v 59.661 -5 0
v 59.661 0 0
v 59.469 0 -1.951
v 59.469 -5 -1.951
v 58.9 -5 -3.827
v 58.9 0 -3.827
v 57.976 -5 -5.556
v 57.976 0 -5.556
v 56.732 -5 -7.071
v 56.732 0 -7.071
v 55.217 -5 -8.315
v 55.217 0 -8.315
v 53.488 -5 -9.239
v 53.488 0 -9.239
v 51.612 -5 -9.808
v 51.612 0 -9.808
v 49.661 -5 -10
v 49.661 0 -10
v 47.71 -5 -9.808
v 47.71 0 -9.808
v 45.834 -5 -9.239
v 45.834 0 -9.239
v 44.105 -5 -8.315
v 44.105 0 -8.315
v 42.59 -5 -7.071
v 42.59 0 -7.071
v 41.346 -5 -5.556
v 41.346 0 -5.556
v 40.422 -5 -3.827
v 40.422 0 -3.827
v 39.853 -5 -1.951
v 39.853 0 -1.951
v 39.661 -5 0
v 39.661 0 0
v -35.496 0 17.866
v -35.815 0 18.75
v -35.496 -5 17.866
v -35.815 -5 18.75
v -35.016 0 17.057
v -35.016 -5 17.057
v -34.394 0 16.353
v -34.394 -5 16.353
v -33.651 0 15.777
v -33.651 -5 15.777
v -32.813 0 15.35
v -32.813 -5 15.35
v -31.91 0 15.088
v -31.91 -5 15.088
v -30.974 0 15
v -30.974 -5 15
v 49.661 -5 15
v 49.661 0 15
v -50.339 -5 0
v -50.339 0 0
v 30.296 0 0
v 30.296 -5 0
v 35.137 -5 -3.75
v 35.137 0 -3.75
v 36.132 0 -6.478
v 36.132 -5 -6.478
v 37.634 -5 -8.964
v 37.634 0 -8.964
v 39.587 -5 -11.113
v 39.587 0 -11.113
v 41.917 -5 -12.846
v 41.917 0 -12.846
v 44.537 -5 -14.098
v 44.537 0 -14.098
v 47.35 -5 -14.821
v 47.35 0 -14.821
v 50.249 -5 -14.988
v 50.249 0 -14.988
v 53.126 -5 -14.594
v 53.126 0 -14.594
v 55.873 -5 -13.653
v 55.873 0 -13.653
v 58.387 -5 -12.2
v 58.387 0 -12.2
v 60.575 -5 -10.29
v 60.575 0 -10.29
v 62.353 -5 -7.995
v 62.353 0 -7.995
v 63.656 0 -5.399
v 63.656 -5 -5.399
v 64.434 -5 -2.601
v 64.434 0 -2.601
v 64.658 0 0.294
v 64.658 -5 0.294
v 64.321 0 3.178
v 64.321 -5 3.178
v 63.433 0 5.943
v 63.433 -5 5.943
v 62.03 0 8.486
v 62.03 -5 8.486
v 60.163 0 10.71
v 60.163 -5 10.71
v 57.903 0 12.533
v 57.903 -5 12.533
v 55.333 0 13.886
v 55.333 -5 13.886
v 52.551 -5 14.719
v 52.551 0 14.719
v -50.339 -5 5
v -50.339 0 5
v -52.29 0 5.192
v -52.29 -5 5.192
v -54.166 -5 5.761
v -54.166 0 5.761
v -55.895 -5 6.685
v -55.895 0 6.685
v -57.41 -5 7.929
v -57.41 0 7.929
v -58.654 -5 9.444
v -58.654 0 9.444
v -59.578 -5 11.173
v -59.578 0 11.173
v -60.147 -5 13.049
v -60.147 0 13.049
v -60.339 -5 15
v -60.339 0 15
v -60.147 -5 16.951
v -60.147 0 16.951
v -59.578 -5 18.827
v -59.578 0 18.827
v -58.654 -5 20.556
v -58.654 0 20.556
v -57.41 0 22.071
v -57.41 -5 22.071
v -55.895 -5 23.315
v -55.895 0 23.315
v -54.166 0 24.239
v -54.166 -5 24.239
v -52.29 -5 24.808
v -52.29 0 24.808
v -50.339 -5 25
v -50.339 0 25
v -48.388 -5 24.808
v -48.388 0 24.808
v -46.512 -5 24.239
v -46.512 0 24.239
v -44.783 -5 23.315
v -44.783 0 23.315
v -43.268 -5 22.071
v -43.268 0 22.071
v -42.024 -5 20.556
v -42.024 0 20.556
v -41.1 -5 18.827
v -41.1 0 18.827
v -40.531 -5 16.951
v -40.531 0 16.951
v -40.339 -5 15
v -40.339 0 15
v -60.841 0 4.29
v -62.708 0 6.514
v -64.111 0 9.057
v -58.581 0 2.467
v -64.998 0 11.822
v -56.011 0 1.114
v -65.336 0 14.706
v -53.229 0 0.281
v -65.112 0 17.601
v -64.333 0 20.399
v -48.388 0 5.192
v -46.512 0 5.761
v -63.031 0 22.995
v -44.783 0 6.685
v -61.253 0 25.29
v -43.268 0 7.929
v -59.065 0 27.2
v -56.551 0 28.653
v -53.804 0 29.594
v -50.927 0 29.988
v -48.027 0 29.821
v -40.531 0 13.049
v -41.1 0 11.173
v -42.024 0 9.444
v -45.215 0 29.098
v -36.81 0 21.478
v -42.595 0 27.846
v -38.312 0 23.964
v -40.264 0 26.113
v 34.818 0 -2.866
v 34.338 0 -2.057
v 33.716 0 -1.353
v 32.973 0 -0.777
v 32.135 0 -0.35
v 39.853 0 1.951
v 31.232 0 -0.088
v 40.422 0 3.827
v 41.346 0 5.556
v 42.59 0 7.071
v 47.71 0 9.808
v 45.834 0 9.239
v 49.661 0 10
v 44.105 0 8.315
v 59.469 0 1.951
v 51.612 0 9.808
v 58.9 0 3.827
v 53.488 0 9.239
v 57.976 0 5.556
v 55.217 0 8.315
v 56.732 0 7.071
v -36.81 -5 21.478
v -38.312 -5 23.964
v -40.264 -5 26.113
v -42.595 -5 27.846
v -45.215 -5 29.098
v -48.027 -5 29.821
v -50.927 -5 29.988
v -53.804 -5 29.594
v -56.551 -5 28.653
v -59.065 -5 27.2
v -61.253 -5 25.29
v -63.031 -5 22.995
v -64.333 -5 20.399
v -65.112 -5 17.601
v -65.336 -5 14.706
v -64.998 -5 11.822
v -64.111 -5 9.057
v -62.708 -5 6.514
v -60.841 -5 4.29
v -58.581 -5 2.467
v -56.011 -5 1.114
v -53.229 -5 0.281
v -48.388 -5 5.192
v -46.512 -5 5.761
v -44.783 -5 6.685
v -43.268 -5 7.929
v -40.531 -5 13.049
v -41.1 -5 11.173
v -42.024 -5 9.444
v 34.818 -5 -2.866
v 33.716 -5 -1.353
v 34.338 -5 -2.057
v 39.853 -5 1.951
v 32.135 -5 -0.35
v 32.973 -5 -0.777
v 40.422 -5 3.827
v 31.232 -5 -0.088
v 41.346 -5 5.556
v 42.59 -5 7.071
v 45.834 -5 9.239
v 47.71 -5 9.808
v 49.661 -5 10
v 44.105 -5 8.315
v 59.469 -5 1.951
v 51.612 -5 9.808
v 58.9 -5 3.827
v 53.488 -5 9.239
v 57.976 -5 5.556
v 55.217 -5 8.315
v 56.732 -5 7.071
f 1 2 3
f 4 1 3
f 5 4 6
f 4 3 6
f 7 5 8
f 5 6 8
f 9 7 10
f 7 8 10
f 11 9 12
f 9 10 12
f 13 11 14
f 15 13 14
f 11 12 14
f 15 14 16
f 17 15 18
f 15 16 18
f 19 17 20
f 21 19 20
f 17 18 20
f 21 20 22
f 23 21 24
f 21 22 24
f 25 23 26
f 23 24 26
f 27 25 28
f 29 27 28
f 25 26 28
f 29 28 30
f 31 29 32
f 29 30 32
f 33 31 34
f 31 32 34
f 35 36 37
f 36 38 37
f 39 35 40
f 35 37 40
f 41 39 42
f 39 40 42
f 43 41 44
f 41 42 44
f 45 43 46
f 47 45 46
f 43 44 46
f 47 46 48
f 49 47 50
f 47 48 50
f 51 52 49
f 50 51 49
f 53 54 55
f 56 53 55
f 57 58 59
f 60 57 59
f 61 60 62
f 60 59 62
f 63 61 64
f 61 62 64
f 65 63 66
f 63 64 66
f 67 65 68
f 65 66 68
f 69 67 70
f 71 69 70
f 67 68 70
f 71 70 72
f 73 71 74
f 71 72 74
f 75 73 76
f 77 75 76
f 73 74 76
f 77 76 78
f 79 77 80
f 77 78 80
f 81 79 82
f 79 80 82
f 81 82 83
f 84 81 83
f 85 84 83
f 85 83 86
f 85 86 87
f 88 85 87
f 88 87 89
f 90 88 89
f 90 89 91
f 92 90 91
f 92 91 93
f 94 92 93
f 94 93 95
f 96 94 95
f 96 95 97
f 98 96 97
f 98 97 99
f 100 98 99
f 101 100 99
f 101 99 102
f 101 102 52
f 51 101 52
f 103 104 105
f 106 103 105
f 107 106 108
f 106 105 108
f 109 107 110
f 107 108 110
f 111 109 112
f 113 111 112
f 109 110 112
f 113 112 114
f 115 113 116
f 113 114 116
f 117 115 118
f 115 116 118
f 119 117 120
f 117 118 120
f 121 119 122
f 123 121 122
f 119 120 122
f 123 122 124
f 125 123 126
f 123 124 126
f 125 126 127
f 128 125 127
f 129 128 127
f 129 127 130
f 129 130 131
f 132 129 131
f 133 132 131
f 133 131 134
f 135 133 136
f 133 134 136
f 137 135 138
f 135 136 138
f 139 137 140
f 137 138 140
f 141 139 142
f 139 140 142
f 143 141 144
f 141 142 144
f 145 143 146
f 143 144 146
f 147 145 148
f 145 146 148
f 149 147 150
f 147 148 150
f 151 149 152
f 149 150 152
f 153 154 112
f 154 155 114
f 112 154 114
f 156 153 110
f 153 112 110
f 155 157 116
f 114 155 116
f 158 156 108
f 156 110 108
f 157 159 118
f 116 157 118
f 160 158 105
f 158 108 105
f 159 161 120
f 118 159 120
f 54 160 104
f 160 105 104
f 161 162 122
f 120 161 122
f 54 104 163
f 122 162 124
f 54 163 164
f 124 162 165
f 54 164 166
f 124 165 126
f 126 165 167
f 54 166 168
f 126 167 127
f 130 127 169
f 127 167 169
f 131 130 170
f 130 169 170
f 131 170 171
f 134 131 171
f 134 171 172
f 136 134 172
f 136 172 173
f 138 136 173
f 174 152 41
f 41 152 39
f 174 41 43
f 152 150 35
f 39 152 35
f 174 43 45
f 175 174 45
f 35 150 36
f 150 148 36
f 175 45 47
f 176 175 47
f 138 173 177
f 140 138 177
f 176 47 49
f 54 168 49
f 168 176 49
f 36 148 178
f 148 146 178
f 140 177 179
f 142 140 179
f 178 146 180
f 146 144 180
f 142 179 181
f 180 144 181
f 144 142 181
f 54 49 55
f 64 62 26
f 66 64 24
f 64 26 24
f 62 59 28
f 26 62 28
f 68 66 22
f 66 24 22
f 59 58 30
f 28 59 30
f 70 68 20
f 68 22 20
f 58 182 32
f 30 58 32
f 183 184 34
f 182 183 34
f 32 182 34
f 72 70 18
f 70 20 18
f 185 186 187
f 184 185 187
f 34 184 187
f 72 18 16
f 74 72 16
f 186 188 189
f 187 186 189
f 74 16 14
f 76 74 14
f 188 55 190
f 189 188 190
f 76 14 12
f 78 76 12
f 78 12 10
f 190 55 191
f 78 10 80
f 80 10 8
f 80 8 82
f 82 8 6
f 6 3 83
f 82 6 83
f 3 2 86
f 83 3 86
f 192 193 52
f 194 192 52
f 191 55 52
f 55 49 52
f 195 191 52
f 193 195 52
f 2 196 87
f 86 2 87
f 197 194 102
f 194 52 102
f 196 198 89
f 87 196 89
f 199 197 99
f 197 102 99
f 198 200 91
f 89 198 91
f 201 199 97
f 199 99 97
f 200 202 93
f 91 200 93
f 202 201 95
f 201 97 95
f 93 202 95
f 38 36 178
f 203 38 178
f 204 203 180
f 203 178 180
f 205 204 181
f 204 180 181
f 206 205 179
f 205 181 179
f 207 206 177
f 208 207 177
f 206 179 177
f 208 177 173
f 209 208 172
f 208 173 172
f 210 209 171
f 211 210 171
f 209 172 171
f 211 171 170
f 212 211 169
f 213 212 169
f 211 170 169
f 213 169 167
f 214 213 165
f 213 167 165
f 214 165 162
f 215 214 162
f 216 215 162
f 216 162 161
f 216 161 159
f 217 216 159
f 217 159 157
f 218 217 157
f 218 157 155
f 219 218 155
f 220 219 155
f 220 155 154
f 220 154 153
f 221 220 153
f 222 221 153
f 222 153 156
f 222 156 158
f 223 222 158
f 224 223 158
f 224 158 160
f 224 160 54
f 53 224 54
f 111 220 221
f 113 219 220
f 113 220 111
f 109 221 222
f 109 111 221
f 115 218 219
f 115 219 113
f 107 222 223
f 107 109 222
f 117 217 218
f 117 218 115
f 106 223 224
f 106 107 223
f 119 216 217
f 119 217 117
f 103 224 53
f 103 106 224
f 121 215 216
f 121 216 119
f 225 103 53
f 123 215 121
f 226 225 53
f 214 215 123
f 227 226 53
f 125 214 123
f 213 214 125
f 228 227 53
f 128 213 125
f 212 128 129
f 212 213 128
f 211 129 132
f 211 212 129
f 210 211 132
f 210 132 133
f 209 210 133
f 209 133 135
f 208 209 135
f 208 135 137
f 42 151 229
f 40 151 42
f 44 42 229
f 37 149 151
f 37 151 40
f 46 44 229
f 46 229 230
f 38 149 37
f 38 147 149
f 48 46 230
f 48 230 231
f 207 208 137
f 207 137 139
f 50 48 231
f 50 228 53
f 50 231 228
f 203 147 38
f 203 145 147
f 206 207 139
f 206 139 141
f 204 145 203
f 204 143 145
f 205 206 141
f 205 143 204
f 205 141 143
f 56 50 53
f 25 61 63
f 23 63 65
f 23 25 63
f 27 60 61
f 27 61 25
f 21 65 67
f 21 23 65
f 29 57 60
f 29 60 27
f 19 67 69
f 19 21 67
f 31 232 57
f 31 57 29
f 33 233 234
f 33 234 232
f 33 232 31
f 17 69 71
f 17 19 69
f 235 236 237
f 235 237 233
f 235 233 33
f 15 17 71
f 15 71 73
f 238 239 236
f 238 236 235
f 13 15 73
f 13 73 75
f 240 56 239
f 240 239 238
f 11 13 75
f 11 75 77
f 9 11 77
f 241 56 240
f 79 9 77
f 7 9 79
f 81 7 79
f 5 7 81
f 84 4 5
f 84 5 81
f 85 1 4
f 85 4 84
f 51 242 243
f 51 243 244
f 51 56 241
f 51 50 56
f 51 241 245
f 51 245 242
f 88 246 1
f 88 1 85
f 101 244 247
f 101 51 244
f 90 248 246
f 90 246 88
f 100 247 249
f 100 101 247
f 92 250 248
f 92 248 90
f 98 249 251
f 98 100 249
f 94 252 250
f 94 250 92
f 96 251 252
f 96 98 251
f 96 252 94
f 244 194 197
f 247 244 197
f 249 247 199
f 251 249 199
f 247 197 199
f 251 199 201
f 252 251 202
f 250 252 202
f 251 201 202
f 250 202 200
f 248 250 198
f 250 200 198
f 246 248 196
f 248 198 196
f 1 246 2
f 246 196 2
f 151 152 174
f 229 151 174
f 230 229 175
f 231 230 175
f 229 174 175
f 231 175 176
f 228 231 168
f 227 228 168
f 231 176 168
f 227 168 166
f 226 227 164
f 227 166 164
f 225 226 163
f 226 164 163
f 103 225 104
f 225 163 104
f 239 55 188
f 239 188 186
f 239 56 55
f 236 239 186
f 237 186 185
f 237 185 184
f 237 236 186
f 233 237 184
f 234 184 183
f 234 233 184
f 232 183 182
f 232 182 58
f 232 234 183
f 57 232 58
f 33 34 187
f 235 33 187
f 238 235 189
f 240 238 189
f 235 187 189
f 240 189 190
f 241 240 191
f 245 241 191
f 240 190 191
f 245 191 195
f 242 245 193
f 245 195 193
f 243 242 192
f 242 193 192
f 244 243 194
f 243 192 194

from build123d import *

# Parameters (mm, degrees)
F1_DEPTH = 5
F2_R     = 5


with BuildPart() as f1:
    # F0 (on Front) → F1 (new body)
    with BuildSketch(Plane.XZ):
        with BuildLine():
            Line((-40.3388801531, 15), (-35.3388801531, 15))
            ThreePointArc((-35.3388801531, 15), (-60.9454818709, 25.6066017178), (-50.3388801531, 0))
            Line((-50.3388801531, 0), (-50.3388801531, 5))
            ThreePointArc((-50.3388801531, 5), (-57.409947965, 22.0710678119), (-40.3388801531, 15))
        make_face()
        with BuildLine():
            ThreePointArc((34.6611198469, 0), (39.0545181291, 10.6066017178), (49.6611198469, 15))
            Line((49.6611198469, 15), (-35.3388801531, 15))
            ThreePointArc((-35.3388801531, 15), (-39.7322784353, 4.3933982822), (-50.3388801531, 0))
            Line((-50.3388801531, 0), (34.6611198469, 0))
        make_face()
        with BuildLine():
            ThreePointArc((-50.3388801531, 0), (-39.7322784353, 4.3933982822), (-35.3388801531, 15))
            Line((-35.3388801531, 15), (-40.3388801531, 15))
            ThreePointArc((-40.3388801531, 15), (-43.2678123412, 7.9289321881), (-50.3388801531, 5))
            Line((-50.3388801531, 5), (-50.3388801531, 0))
        make_face()
        with BuildLine():
            ThreePointArc((64.6611198469, 0), (60.2677215647, 10.6066017178), (49.6611198469, 15))
            Line((49.6611198469, 15), (49.6611198469, 10))
            ThreePointArc((49.6611198469, 10), (56.7321876588, 7.0710678119), (59.6611198469, 0))
            ThreePointArc((59.6611198469, 0), (49.6611198469, -10), (39.6611198469, 0))
            Line((39.6611198469, 0), (34.6611198469, 0))
            ThreePointArc((34.6611198469, 0), (49.6611198469, -15), (64.6611198469, 0))
        make_face()
        with BuildLine():
            Line((49.6611198469, 10), (49.6611198469, 15))
            ThreePointArc((49.6611198469, 15), (39.0545181291, 10.6066017178), (34.6611198469, 0))
            Line((34.6611198469, 0), (39.6611198469, 0))
            ThreePointArc((39.6611198469, 0), (42.590052035, 7.0710678119), (49.6611198469, 10))
        make_face()
    extrude(amount=F1_DEPTH)

    # F2
    f2_edges = [f1.edges().sort_by_distance(p)[0] for p in [
        (-35.33888, -2.5, 15),
        (34.66112, -2.5, 0),
    ]]
    fillet(f2_edges, radius=F2_R)


solid = f1.part
